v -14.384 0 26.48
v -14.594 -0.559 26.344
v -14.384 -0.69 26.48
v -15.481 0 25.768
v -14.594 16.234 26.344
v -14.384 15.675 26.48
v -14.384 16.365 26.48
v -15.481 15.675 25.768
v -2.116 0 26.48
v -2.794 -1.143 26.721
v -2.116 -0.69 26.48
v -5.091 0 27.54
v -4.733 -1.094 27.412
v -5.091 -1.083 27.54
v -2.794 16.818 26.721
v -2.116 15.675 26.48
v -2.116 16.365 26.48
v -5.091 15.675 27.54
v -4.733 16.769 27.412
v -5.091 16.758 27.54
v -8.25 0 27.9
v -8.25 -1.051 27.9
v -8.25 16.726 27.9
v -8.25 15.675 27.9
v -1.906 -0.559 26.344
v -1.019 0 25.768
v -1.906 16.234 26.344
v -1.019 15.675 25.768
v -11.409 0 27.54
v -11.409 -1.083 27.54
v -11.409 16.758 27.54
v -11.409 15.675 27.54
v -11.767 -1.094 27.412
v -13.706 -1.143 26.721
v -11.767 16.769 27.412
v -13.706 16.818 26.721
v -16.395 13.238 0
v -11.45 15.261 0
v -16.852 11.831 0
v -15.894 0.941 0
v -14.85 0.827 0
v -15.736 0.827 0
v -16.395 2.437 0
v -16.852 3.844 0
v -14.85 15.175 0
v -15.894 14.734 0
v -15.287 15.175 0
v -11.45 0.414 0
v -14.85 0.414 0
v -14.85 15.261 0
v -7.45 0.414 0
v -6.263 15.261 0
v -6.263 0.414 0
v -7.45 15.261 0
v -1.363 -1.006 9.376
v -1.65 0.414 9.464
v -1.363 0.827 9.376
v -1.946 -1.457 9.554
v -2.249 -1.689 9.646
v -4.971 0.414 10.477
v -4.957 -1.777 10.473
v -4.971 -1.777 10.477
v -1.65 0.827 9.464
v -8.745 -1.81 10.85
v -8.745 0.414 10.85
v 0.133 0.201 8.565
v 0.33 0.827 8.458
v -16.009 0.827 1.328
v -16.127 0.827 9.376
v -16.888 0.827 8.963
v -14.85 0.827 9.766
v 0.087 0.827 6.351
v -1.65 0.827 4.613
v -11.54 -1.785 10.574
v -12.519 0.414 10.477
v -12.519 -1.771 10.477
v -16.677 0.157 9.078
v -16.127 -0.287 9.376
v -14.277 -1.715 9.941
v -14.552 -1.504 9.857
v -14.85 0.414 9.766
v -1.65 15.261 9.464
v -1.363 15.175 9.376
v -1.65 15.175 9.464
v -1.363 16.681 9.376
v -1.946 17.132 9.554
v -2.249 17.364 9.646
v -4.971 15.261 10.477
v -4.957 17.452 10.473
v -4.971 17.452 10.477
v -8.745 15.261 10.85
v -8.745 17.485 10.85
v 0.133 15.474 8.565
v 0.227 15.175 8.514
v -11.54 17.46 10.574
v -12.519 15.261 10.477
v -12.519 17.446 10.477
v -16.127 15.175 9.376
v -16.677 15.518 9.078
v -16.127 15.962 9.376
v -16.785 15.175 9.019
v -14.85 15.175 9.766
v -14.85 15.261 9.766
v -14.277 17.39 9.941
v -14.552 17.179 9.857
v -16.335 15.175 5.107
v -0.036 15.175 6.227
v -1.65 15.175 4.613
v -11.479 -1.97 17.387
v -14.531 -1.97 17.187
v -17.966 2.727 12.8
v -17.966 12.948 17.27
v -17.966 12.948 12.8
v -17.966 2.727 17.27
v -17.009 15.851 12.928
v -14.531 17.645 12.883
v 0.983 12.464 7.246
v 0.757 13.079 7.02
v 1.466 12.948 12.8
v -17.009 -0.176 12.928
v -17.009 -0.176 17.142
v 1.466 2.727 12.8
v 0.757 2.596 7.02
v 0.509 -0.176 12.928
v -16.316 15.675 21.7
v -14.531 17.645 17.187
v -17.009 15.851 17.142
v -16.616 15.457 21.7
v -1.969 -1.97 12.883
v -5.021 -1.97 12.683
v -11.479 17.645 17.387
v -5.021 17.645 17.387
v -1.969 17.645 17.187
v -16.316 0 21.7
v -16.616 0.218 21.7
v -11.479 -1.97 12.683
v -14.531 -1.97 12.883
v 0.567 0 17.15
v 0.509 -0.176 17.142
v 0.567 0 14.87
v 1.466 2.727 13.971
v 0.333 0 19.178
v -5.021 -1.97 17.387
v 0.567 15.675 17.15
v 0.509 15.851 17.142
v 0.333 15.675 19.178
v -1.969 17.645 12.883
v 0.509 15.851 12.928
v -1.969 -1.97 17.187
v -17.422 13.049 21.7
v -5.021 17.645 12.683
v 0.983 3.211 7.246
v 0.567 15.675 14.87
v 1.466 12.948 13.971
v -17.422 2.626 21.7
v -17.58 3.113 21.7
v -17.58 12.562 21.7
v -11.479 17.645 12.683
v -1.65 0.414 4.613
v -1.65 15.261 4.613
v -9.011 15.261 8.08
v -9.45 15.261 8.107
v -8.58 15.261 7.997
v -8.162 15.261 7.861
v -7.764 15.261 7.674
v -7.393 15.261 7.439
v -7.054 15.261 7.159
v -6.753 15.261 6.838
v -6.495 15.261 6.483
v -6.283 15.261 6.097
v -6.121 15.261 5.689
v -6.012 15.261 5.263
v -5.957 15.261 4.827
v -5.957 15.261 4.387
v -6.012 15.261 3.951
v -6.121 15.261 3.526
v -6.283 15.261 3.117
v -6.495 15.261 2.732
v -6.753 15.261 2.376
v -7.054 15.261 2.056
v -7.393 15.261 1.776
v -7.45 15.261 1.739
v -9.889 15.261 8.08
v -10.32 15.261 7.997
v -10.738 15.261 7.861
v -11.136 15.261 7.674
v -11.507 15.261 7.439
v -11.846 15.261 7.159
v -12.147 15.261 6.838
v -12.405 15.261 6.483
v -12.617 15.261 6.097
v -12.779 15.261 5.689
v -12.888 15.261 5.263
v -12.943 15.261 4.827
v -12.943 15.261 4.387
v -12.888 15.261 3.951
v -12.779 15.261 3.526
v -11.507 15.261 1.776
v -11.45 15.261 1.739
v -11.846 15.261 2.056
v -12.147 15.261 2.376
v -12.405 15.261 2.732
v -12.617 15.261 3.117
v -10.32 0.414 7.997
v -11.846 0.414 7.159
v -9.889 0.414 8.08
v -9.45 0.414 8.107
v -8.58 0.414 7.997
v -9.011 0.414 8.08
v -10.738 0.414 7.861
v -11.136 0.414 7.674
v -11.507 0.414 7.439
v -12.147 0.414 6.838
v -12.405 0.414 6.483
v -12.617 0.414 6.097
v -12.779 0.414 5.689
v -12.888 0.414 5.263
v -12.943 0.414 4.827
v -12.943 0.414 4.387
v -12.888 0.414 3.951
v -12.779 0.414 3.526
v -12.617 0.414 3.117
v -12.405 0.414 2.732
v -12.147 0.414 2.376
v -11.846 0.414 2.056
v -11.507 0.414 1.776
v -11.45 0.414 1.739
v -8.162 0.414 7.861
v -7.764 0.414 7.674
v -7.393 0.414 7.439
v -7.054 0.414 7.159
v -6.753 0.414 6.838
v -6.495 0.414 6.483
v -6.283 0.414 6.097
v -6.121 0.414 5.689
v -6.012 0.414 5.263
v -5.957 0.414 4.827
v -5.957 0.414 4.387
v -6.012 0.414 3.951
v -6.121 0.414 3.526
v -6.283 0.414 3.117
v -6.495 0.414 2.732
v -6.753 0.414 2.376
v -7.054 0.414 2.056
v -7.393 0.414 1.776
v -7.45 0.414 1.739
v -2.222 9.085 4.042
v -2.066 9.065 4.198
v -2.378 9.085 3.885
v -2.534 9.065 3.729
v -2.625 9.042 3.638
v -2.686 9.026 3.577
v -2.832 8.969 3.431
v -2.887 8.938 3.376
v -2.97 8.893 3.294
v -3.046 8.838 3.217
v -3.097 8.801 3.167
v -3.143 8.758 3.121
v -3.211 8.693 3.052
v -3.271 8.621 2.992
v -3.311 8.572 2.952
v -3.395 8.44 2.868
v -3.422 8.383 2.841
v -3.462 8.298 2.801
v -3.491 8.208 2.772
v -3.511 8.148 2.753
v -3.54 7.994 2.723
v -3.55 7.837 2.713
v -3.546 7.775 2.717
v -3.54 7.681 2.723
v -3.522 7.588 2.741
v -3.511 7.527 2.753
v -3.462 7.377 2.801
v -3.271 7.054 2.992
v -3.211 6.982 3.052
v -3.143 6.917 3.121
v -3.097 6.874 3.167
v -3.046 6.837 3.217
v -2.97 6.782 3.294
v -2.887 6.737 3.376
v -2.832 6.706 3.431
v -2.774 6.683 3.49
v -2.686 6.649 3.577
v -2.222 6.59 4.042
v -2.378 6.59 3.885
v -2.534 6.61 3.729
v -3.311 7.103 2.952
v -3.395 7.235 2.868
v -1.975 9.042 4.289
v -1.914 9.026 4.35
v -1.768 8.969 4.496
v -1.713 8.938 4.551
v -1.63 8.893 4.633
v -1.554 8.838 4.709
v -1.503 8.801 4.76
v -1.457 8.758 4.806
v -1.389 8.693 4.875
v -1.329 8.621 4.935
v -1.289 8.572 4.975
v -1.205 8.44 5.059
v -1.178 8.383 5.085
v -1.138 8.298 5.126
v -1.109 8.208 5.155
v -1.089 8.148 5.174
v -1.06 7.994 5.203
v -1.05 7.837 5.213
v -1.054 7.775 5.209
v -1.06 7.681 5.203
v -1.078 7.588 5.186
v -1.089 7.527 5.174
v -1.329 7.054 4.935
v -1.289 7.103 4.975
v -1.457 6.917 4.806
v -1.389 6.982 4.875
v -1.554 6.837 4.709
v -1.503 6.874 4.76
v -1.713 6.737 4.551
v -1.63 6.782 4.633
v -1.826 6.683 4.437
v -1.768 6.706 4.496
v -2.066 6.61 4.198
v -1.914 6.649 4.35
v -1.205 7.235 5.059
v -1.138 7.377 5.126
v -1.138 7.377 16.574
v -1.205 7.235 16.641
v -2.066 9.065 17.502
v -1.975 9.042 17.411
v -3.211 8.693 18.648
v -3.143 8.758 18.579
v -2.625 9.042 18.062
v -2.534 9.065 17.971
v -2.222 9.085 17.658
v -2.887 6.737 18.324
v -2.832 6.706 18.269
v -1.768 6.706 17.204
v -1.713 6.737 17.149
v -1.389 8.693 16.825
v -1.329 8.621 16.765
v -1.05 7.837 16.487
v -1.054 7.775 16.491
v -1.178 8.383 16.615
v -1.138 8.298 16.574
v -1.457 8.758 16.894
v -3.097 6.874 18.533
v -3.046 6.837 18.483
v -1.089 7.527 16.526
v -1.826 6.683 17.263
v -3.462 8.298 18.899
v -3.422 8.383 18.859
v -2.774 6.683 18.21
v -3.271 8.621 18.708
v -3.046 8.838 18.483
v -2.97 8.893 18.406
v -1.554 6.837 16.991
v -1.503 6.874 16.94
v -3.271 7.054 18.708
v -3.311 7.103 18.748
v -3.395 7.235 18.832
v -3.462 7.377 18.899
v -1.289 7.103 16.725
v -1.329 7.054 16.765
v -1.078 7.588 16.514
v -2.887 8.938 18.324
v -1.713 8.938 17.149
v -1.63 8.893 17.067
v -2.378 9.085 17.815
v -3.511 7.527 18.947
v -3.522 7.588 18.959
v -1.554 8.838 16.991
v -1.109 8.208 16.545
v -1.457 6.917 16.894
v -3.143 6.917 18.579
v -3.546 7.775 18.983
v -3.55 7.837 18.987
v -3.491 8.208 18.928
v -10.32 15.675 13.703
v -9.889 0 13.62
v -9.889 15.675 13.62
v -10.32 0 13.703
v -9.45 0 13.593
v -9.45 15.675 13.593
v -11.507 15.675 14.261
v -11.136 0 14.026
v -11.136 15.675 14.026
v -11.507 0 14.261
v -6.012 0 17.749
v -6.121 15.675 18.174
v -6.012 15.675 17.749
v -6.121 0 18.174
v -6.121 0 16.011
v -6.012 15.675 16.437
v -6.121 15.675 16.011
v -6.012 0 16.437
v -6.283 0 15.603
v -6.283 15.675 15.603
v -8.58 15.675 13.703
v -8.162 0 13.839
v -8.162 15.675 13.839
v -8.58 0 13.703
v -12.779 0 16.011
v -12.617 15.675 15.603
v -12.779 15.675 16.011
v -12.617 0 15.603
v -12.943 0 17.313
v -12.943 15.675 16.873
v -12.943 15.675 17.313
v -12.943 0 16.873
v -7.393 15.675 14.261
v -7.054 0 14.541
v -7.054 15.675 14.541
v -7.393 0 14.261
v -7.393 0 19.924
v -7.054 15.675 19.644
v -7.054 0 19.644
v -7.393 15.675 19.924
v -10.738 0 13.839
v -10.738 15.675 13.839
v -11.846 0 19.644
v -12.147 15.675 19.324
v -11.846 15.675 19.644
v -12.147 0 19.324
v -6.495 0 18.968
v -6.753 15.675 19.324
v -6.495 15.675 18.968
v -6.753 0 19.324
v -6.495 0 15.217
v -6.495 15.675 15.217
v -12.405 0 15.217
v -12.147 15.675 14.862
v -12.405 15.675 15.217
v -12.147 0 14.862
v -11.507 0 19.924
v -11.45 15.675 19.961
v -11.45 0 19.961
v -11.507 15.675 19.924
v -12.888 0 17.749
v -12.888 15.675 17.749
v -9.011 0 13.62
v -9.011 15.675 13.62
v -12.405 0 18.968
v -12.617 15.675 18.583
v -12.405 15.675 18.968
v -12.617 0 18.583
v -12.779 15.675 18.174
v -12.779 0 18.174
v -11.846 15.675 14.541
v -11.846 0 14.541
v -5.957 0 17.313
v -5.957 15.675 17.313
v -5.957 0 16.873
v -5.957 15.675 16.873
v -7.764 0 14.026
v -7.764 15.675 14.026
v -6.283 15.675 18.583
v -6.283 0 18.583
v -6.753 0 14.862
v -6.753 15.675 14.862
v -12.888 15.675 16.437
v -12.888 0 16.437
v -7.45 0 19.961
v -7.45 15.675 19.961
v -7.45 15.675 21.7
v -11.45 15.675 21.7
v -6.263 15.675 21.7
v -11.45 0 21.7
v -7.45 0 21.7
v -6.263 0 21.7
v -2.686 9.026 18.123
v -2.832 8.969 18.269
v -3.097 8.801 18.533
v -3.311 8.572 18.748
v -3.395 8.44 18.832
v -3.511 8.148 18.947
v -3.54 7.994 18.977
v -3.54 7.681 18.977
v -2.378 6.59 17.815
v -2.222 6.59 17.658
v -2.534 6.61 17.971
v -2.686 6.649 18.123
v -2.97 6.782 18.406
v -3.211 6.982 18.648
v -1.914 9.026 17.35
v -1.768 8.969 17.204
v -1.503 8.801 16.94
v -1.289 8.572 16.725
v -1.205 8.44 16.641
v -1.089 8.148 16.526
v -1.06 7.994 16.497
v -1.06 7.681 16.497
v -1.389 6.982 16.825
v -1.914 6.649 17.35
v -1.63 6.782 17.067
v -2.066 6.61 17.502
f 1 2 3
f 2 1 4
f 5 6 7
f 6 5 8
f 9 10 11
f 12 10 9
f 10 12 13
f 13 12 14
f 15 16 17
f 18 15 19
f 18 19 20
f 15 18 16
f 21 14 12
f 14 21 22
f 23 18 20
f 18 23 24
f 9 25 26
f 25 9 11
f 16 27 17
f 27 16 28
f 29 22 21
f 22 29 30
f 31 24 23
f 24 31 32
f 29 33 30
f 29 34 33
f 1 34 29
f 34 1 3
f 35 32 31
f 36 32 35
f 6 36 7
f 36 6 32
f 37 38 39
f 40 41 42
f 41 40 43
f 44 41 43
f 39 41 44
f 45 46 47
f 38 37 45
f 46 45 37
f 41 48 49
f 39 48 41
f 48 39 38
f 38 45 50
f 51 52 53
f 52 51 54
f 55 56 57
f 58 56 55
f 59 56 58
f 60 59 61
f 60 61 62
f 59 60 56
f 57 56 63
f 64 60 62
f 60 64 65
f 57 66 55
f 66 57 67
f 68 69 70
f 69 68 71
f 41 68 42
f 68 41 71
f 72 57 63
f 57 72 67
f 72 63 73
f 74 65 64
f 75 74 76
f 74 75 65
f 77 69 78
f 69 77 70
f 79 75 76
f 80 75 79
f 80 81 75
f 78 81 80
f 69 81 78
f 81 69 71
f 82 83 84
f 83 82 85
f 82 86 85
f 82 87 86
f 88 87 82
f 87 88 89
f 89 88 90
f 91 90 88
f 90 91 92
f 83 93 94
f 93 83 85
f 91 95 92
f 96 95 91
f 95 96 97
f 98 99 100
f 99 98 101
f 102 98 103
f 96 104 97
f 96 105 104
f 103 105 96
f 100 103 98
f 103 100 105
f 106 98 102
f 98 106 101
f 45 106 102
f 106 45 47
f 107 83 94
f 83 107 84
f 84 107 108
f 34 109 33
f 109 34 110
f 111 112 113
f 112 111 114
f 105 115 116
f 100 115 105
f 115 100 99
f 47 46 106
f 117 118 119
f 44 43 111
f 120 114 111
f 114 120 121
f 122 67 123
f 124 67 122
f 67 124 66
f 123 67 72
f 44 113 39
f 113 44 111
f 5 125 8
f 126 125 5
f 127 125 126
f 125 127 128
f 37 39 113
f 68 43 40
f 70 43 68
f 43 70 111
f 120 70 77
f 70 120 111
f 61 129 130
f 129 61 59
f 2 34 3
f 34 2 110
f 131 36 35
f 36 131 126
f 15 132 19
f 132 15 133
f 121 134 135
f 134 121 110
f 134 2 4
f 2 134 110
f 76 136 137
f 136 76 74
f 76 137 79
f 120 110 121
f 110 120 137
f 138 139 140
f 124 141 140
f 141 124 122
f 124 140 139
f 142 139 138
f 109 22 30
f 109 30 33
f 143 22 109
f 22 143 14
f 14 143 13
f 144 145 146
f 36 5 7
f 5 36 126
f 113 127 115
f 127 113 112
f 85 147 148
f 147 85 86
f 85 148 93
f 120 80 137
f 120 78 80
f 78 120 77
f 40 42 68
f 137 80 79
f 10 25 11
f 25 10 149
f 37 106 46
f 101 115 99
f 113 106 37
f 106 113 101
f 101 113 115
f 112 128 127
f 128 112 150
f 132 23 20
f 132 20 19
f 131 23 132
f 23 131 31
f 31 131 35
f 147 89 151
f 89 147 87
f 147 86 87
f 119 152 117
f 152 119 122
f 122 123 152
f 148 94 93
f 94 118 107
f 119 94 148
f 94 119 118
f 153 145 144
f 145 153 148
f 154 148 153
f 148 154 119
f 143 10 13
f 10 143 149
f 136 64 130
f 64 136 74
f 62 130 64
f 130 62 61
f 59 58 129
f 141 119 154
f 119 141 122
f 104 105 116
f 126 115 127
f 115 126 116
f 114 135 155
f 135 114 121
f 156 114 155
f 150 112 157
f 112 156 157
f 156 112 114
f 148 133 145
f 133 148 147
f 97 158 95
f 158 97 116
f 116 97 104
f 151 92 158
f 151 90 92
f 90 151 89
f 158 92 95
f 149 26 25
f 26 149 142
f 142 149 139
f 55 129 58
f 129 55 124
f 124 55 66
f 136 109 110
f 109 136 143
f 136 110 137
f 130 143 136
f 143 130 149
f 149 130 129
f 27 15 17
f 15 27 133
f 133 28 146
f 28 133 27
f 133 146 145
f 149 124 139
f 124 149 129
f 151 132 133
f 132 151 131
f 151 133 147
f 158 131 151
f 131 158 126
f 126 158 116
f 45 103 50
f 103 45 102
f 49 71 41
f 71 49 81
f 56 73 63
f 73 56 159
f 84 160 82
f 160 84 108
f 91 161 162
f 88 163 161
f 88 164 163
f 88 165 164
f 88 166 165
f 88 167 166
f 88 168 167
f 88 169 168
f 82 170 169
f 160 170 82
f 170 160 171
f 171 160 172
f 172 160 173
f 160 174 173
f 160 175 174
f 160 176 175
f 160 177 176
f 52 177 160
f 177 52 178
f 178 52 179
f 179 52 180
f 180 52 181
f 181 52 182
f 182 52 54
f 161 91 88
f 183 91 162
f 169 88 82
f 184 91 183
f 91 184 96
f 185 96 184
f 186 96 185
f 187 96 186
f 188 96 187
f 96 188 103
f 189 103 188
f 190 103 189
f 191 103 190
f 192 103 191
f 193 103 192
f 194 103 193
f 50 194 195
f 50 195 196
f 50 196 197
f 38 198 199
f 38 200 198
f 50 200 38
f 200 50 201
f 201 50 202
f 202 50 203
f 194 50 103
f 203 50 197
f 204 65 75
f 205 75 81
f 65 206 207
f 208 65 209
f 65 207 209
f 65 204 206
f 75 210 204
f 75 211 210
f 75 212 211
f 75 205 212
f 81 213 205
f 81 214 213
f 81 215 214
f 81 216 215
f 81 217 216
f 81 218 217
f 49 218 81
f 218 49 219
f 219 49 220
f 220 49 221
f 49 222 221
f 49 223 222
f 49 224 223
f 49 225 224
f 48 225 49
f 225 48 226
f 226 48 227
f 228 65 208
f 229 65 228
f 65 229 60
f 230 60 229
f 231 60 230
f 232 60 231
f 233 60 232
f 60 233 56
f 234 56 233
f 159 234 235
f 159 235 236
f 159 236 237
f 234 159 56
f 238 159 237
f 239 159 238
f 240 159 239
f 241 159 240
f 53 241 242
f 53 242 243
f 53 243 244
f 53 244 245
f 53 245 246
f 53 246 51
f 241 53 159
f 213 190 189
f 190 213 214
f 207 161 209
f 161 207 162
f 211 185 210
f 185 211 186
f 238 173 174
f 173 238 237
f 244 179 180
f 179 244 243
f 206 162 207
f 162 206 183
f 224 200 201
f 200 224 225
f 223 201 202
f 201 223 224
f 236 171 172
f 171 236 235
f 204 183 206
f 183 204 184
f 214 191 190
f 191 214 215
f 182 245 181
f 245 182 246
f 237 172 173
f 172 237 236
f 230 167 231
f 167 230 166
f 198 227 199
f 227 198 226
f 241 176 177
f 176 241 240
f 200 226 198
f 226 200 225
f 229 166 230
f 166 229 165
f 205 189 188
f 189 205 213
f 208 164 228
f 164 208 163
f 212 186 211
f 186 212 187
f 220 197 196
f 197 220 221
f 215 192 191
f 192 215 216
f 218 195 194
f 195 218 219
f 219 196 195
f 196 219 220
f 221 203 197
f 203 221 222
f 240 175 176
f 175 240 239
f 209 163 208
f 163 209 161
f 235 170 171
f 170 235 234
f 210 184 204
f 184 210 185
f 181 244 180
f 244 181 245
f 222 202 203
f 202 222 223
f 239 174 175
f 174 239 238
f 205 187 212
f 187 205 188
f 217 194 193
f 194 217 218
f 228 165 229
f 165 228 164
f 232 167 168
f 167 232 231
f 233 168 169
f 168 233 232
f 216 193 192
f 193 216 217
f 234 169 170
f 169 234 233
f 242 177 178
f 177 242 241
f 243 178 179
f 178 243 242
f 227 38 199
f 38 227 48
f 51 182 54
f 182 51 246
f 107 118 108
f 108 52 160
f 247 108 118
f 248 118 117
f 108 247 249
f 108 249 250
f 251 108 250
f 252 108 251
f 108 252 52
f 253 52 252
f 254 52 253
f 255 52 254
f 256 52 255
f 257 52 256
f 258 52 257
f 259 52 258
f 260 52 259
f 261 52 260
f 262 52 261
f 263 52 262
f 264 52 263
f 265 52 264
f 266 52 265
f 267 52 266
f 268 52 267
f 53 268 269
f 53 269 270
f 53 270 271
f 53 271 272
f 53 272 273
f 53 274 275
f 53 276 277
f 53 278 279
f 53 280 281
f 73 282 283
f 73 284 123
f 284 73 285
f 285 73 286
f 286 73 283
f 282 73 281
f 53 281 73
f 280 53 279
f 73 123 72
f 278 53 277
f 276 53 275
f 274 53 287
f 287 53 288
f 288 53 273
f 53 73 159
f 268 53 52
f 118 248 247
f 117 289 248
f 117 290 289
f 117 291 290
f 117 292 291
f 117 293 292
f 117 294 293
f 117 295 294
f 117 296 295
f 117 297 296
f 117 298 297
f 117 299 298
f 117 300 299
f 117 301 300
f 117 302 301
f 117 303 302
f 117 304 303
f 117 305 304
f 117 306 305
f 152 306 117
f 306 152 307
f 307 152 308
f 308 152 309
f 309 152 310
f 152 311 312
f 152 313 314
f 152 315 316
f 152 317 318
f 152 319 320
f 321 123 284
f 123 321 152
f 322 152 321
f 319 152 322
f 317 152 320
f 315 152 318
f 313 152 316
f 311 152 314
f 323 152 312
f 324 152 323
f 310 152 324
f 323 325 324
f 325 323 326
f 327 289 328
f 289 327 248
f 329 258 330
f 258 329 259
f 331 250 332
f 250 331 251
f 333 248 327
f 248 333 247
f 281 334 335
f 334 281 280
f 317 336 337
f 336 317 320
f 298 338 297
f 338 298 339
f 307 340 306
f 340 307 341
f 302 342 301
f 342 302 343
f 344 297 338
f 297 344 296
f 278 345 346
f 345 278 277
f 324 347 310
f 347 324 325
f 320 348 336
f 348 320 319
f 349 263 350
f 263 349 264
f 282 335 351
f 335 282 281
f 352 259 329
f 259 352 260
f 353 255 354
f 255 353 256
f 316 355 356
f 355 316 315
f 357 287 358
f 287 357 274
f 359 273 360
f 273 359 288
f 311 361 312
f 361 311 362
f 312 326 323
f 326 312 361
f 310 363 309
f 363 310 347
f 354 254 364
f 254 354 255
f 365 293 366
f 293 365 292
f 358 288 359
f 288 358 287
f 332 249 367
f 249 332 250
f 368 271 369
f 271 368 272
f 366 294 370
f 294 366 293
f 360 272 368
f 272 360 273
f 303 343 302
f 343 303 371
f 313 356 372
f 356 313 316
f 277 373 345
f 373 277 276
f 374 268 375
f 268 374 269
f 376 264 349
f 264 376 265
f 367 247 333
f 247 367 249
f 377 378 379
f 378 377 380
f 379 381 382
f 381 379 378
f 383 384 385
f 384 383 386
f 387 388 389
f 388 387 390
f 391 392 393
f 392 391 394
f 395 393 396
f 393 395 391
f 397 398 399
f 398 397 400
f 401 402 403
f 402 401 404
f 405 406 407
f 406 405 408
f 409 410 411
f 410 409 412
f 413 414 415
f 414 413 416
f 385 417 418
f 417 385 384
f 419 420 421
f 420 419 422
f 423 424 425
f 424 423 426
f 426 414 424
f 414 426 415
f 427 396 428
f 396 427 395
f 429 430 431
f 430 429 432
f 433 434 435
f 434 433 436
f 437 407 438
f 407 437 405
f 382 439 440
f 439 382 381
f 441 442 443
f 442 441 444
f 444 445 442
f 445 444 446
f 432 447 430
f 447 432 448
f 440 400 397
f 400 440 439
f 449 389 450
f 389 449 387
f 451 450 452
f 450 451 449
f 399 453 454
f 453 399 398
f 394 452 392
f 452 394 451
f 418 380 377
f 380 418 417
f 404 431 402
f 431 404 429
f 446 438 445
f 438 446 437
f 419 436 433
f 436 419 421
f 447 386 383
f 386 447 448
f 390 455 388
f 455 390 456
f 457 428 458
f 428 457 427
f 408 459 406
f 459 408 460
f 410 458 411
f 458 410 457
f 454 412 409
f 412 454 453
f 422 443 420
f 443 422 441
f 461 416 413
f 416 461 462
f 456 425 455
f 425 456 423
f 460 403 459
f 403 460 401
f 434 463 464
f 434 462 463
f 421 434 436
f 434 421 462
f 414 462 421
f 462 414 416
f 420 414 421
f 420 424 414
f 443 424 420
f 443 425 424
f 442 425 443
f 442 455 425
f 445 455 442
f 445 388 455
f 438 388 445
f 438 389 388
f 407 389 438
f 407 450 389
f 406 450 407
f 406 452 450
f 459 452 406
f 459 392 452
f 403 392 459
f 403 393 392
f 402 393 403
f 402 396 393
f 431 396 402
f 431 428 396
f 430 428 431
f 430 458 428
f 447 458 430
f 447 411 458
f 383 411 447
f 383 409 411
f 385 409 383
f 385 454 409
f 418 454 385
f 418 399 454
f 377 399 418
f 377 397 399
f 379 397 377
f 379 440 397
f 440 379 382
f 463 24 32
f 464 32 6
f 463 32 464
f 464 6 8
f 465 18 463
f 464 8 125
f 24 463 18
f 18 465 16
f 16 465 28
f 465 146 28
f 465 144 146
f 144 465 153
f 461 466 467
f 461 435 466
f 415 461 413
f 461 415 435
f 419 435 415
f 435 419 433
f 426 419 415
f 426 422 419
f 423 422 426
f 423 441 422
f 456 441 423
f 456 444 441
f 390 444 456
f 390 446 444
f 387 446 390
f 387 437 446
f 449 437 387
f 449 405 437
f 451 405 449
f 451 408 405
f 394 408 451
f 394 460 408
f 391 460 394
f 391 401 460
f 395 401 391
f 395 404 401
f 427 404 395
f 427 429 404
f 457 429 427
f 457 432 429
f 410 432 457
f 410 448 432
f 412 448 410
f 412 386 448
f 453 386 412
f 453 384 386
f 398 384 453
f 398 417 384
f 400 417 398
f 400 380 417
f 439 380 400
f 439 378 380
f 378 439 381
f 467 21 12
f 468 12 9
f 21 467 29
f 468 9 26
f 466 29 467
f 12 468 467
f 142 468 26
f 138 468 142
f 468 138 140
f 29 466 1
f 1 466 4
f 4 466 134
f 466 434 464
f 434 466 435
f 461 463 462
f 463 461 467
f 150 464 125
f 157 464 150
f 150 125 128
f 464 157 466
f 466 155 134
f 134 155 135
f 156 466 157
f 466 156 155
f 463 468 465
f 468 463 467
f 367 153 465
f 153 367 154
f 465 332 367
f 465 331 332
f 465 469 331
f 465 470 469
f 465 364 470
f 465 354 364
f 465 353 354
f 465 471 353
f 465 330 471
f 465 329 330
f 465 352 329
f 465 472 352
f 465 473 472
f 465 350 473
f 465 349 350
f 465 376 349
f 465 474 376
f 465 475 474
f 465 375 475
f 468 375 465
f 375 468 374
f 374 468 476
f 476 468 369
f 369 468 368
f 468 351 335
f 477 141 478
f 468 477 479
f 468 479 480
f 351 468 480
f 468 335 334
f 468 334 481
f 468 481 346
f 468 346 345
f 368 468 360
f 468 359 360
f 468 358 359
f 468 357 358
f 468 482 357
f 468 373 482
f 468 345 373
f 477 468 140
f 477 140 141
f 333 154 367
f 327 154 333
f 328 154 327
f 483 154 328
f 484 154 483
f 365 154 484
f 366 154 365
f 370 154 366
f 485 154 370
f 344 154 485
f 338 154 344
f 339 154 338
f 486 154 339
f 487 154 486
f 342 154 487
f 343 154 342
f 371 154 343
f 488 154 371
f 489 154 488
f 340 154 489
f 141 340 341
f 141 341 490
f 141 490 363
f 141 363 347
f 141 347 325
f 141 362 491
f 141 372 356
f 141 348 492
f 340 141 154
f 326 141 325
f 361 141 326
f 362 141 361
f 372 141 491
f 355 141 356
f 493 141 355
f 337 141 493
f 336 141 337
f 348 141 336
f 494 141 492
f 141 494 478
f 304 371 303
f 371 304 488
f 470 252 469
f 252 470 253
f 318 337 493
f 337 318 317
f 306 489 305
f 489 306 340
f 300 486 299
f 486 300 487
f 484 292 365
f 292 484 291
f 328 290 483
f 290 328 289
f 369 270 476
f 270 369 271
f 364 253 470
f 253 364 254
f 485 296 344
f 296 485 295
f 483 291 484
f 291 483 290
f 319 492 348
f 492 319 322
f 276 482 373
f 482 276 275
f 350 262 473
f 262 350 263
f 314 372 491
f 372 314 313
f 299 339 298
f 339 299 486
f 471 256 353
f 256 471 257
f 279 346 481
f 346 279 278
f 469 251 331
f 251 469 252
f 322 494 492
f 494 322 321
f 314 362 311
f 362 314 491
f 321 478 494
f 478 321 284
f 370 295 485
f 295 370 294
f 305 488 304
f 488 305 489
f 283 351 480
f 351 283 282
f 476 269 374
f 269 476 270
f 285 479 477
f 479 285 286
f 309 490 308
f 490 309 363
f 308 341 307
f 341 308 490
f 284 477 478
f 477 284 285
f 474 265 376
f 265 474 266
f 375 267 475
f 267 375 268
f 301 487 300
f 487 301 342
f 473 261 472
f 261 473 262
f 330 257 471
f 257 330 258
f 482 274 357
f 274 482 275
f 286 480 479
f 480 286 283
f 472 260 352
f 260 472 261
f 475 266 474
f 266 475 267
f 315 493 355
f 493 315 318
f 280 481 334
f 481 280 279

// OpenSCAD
// file: util/finger_base.scad
include <../../config.scad>

rotate([0,-90,0]) fingerbase();

//	Base segment of finger, can be lengthened
module fingerbase(length=20, proximalHole=true, distalHole=true)
{
	difference() {
		scale([yScaleFactor,xScaleFactor,zScaleFactor]) {
			fingerbasesolid(length);
		}
		if(proximalHole) {
			translate([0,knucklePadding/2 * xScaleFactor,0]) fingerhardwarecutouts(jointDia, jointThick, knuckleW=knuckleW-knucklePadding, fingerLen=length);
		}
		if (distalHole) {
			translate([length * yScaleFactor,0,0]) mirror([1,0,0]) fingerhardwarecutouts(jointDia, jointThick, knuckleW=knuckleW, fingerLen=length);
		}
	}


	
}

module fingerhardwarecutouts(jointDia,jointThick,knuckleW,fingerLen,holeCutoff=100) {
	//slot for flex joint
	translate([7 - (15/jointDia),0,6*zScaleFactor - (1.8/jointThick)]) {
		rotate([90,0,0]) translate([-0.25,0,-knuckleW*xScaleFactor]) cylinder(d=jointDia, h=knuckleW*xScaleFactor, $fn=50);
		translate([-25,(knuckleW*xScaleFactor) / 2,0]) cube([50,knuckleW*xScaleFactor,jointThick], center=true);
	}
	//cubic parts
	translate([-100,0,0]) cube([100,knuckleW*xScaleFactor,100]);
	translate([-13/zScaleFactor,0,0]) rotate([0,45,0]) translate([-50,0,0]) cube([100,knuckleW * xScaleFactor, 10]);

	//channel for string/tendon
	translate([-fingerLen/2 * yScaleFactor, knuckleW/2 * xScaleFactor, 2.3]) rotate([0,90,0]) cylinder(d=2.5, h=holeCutoff, $fn=50);
}

//	base segment of finger, solid
module fingerbasesolid(length=50, cutout=true) {
	difference() {
		//cubic part
		translate([0,0.001 + knucklePadding/2,1]) cube([length, knuckleW - knucklePadding - 0.002, 8]);
	}
	
	//cylindrical-ish part around finger
	intersection() {
		//overly large shape to get the cross section in the XZ plane from
		difference() {
			union() {
				translate([length-4,-5,5]) rotate([-90,0,0]) cylinder(r=8,h=knuckleW + 10);
				translate([0,-5,-5]) cube([length,knuckleW + 10,20]);
			}
			//cutout for the side "guards" of the previous knuckle
			if(cutout) {
				translate([-4,-knuckleW+0.001,5.3]) rotate([-90,0,0]) cylinder(r=11,h=10);
				translate([-4,knuckleW - knucklePadding*(1/xScaleFactor),5.3]) rotate([-90,0,0]) cylinder(r=11,h=10);
			}
		}

		hull() {
			for(i=[-1,1], j=[-1,1]) {
				//angled cylinders to provide the outer shape of the finger
				translate([length/10,i*2.4 + knuckleW/2,j*2.2 + 5]) rotate([i*j*-4,j*86,0]) cylinder(d=6,h=20,center=true);
				translate([length+4, i*2.4 + knuckleW/2, j*2.2 + 5]) rotate([i*j*-4,j*-86,0]) cylinder(d=6,h=20,center=true);
			}
		}
	}
}
// file: ../config.scad
/**
 * Configuration settings for Flexy Beast, required to generate correctly sized STLs of the printed parts. See the Configuration File Assembly instructions to set this up.
 * @id config_file
 * @name Configuration File
 * @category Prerequisites!
 * @step Open config.scad in your favorite text editor.
 * @step As per the normal Cyborg Beast instructions, measure the width of the knuckles in the non-affected hand and convert to millimeters.
 * @step Add 5 to that result and then divide by 55.
 * @step Replace the x-, y-, and zScaleFactor variables in config.scad with that number.
 * @step If desired, adjust the proportions of the hand by changing those variables individually. xScaleFactor controls the width of the hand, yScaleFactor controls the length, and zScaleFactor controls the height.
 * @step Open assembly.scad in OpenSCAD to check that the flexy joint holes are not too large for the hand (should only be necessary for small children). If necessary, reduce the jointDia and jointThick variables. jointDia=5 and jointThick=2 is a good amount for smaller hands.
 * @step Set the fingerPads variable to true or false depending on whether you want to cast silicone finger pads for improved grip.
 * @step Open palm.scad, finger_base.scad, finger_tip.scad, and thumb_tip.scad in OpenSCAD, render each part (F6), and export as STL, then print. Suggested print settings are 0.2mm or smaller layer height, 3 perimeters, and 25% rectilinear or hexagonal infill.
 */

knuckleR = 4.85;
knucklePadding = 0.5;
knuckleW = 9.5;
wristH = 10;
palmH = 20;
palmW = 64;
th = 3;
fn = 32;

//flexy joint parameters
jointDia = 7;
jointThick = 4;

//finger settings
fingerPads = true; //whether or not to hollow the finger tips slightly for molding pads
fingerLength = 1; //multiply the length of all fingers by this amount
thumbProp = 0.8; //proportion of thumb length relative to other fingers (note that the thumb is a segment shorter than the other fingers already)
indexProp = 0.8; //proportion of index finger length relative to other fingers
middleProp = 1; //proportion of middle finger length relative to other fingers
ringProp = 0.8; //proportion of ring finger length relative to other fingers
pinkyProp = 0.7; //proportion of pinky finger length relative to other fingers

//misc settings
thermoform = true; //whether or not to generate a thermoformable mesh for the palm

//desired scale factor for hand based on the standard Cyborg Beast/Robohand sizing guide
xScaleFactor = 1.65; // [1.05:1.60]
yScaleFactor = 1.55; // [1.05:1.60]
zScaleFactor = 1.65; // [1.05:1.60]
// main file
include <../config.scad>
use <util/finger_base.scad>

rotate([0,-90,0]) fingerbase(length = 20 * pinkyProp * fingerLength);

/**
 * Proximal phalanx for pinky finger - rendered from parts/finger_pinky_base.scad
 * @id pinky_base
 * @name Pinky Finger Base
 * @category Printed
 */
